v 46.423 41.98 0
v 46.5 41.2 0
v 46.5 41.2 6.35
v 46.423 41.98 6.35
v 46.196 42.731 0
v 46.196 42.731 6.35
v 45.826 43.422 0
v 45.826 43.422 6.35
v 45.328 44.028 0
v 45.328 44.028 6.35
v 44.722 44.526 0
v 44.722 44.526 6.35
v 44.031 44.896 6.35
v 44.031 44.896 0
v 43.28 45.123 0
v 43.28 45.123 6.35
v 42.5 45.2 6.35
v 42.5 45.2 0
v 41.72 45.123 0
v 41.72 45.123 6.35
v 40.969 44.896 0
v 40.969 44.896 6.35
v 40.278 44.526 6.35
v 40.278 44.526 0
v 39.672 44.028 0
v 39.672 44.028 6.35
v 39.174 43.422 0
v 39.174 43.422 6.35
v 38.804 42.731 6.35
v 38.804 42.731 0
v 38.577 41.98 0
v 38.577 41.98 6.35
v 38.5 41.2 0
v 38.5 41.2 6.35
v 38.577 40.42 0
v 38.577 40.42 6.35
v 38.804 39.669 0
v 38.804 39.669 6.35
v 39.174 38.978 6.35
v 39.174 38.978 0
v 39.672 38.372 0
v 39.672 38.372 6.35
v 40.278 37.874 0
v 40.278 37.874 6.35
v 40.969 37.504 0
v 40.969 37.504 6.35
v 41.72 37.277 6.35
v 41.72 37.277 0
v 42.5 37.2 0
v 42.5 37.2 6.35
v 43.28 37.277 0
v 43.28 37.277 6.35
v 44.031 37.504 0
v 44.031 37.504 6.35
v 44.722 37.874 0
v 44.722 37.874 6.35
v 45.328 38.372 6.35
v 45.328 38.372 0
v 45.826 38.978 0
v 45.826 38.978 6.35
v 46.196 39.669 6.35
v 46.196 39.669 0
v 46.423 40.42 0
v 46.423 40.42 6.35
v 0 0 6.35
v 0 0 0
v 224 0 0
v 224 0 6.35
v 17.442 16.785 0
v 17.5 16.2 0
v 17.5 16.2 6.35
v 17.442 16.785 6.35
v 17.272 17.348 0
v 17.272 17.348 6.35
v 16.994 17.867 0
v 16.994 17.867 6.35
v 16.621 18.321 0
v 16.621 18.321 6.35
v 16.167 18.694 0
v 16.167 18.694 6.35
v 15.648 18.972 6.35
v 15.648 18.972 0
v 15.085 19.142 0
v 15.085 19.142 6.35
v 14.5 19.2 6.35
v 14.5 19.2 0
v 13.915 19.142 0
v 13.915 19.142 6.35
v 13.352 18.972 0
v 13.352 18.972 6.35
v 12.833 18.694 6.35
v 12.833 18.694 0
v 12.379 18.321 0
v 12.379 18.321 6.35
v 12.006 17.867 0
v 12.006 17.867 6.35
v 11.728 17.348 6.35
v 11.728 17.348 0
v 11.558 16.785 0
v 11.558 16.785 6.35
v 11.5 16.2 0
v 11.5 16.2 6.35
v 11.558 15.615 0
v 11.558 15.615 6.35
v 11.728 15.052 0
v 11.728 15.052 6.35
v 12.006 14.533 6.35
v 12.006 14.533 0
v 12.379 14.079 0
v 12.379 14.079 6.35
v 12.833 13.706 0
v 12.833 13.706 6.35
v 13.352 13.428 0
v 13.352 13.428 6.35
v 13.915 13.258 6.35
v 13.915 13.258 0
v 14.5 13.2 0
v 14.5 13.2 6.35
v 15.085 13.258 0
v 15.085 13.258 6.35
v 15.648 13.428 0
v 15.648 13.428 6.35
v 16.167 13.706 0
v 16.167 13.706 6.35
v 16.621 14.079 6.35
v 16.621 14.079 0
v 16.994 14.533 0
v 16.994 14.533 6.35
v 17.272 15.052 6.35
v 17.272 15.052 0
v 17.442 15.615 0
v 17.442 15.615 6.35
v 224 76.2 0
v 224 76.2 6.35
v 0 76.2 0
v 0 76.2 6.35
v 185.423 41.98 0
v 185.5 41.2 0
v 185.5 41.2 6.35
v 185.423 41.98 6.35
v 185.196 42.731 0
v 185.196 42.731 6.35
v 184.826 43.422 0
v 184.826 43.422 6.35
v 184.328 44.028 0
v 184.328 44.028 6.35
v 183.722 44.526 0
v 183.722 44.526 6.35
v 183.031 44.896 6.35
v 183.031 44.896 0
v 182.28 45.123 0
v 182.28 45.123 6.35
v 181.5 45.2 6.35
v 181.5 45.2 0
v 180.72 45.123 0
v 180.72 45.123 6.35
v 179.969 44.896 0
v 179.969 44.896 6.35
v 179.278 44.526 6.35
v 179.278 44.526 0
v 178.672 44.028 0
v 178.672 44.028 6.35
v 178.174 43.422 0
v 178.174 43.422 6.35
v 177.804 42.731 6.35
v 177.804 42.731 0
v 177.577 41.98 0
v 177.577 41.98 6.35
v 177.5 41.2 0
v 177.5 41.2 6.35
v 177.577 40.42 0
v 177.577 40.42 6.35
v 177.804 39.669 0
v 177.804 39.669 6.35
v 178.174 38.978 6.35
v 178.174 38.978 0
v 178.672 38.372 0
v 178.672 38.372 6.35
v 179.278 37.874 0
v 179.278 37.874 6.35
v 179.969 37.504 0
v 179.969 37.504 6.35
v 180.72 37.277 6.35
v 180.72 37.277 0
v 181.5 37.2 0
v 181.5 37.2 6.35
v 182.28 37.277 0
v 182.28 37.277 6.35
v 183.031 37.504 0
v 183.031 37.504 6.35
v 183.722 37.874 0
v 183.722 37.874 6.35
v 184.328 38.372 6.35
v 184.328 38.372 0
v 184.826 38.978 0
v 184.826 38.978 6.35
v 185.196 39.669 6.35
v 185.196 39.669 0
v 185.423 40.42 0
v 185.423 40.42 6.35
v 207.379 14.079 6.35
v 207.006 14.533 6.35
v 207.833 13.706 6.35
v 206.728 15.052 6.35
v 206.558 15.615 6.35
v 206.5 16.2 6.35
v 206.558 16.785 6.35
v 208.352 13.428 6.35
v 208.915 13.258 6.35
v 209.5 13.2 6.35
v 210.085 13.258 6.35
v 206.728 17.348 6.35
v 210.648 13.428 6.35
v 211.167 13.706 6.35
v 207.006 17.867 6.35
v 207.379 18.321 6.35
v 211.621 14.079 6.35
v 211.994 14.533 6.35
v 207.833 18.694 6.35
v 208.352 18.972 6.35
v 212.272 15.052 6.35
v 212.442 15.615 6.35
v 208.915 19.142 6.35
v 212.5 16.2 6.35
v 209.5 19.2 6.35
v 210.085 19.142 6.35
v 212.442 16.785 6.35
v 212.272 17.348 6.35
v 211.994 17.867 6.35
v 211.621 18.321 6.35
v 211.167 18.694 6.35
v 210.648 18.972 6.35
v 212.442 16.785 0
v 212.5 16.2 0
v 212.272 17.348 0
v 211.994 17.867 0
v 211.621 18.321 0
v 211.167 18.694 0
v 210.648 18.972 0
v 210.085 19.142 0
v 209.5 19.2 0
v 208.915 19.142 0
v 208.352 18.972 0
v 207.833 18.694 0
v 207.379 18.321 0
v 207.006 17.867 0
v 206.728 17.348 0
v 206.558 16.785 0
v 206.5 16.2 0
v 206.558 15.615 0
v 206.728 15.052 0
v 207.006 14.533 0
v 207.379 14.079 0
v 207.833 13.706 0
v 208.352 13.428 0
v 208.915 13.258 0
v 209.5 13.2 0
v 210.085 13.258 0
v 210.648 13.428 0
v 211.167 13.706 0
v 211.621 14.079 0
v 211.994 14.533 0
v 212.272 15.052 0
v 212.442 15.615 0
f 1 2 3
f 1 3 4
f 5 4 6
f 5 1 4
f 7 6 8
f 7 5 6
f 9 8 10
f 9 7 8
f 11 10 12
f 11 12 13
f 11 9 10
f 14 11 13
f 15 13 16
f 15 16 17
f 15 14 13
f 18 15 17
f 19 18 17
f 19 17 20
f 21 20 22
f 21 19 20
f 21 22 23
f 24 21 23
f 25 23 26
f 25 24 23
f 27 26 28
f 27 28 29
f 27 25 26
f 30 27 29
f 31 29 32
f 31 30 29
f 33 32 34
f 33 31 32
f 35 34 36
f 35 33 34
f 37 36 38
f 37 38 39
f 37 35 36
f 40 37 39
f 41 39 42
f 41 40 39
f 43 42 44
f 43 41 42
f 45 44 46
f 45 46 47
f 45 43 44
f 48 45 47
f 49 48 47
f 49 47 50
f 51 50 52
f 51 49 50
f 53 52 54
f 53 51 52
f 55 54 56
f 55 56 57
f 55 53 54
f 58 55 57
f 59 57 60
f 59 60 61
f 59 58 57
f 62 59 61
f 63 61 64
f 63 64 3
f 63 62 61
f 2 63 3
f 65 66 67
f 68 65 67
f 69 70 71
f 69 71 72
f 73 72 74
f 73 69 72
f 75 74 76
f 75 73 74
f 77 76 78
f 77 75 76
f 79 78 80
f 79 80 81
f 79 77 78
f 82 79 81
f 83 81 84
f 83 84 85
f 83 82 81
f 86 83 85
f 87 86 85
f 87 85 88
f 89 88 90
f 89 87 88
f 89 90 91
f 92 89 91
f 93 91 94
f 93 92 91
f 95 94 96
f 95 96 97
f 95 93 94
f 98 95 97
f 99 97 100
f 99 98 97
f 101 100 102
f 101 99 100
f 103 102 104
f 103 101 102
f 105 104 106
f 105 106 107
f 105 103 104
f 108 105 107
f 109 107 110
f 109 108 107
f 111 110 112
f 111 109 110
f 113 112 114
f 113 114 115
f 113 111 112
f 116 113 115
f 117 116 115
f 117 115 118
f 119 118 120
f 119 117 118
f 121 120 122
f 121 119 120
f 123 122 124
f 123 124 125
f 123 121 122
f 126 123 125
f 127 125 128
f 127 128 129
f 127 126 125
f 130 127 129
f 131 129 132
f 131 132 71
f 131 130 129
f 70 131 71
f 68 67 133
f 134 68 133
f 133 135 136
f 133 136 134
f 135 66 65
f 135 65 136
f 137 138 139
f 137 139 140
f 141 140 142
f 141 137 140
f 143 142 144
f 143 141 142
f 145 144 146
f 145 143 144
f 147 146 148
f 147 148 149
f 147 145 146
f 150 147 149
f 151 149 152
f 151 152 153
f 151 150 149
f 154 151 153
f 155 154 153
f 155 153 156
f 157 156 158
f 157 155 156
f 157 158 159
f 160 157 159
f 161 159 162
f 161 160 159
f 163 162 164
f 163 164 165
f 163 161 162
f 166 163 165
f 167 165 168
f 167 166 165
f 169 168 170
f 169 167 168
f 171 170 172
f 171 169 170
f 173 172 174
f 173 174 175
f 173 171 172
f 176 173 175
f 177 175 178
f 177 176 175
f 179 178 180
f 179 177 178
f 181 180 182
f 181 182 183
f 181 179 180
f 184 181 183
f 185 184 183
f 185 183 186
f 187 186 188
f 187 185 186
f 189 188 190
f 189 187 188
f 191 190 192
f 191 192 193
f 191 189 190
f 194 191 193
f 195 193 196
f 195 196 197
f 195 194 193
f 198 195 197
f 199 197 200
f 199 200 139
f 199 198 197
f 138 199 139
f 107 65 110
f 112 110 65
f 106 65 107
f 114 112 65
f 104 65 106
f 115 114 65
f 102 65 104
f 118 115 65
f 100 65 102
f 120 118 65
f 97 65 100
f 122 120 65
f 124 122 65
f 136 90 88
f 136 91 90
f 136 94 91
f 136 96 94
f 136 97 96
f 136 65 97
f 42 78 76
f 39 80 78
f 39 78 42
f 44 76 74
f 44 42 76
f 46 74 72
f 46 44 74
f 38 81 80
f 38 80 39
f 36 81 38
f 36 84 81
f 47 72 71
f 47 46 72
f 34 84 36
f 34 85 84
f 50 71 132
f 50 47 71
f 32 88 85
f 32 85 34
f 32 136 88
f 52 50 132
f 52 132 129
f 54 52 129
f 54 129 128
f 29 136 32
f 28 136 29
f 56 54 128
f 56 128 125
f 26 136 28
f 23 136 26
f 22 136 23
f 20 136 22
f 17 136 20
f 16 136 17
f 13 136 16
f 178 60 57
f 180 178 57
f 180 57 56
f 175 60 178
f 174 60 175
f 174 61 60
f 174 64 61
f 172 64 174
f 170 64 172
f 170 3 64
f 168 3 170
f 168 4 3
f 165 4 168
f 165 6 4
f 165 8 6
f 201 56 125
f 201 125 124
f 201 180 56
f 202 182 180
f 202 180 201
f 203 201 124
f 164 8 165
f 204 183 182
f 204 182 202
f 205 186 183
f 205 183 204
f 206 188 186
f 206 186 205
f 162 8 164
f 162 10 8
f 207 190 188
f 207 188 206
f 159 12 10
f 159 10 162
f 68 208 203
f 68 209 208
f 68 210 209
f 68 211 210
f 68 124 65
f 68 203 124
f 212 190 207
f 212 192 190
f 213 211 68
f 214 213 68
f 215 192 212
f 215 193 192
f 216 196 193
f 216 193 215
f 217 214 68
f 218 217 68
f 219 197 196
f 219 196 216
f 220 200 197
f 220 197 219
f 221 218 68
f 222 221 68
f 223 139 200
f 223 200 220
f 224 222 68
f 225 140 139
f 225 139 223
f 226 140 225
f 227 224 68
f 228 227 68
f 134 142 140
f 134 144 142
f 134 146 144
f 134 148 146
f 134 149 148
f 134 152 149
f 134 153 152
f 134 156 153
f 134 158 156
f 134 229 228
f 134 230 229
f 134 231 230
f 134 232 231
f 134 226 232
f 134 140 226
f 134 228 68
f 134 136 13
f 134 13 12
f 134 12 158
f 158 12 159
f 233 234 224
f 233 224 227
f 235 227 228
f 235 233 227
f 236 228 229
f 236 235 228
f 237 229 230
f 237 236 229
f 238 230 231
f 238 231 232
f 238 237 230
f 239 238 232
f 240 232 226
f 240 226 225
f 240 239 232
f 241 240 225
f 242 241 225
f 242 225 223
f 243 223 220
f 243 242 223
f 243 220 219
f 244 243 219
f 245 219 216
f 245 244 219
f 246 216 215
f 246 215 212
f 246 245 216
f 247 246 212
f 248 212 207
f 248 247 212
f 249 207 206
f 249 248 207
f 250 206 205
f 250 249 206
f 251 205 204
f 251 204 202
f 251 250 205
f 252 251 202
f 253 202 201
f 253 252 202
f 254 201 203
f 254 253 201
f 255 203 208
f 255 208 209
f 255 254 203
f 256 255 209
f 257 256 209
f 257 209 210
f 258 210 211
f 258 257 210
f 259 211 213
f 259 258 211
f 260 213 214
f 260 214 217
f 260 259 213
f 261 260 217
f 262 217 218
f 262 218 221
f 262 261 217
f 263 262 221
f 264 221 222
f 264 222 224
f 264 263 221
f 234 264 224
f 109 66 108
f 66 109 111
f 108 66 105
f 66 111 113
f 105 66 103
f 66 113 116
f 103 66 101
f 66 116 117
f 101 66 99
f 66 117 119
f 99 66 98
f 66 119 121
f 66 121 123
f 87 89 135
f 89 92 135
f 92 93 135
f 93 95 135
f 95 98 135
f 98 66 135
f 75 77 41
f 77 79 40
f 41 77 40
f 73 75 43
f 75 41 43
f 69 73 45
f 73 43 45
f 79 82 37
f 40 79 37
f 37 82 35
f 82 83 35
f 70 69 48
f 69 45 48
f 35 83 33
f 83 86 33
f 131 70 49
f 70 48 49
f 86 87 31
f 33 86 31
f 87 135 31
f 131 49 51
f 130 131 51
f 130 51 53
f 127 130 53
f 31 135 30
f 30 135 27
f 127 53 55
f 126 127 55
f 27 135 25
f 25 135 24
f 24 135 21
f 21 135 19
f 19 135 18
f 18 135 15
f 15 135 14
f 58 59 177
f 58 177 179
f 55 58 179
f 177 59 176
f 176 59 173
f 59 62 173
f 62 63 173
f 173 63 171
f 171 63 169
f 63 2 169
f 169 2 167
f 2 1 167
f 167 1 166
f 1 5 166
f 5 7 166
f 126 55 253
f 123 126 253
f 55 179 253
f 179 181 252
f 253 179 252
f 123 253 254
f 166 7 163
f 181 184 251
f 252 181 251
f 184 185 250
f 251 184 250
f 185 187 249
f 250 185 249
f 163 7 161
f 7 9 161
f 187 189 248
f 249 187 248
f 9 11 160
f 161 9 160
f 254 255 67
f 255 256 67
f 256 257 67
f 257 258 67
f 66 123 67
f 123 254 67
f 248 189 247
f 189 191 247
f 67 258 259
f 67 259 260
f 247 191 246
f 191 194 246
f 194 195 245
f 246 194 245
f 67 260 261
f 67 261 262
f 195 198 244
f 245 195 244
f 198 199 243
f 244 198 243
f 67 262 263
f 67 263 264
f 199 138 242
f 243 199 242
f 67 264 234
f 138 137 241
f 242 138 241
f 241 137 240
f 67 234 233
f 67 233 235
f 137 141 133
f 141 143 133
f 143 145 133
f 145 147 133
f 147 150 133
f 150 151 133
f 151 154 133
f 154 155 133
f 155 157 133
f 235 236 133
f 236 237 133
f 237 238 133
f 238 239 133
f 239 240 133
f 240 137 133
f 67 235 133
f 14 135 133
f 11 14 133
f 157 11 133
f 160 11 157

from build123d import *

# Parameters (mm, degrees)
SKETCH1_W           = 224
SKETCH1_H           = 76.2
SKETCH1_R           = 4
SKETCH1_R_2         = 3
BOSS_EXTRUDE1_DEPTH = 6.35


with BuildPart() as part:
    # Sketch1 → Boss-Extrude1 (new body)
    with BuildSketch(Plane.XY):
        with Locations((112, 38.1)):
            Rectangle(SKETCH1_W, SKETCH1_H)
        with Locations((42.5, 41.2)):
            Circle(SKETCH1_R, mode=Mode.SUBTRACT)
        with Locations((181.5, 41.2)):
            Circle(SKETCH1_R, mode=Mode.SUBTRACT)
        with Locations((14.5, 16.2)):
            Circle(SKETCH1_R_2, mode=Mode.SUBTRACT)
        with Locations((209.5, 16.2)):
            Circle(SKETCH1_R_2, mode=Mode.SUBTRACT)
    extrude(amount=BOSS_EXTRUDE1_DEPTH)


solid = part.part
